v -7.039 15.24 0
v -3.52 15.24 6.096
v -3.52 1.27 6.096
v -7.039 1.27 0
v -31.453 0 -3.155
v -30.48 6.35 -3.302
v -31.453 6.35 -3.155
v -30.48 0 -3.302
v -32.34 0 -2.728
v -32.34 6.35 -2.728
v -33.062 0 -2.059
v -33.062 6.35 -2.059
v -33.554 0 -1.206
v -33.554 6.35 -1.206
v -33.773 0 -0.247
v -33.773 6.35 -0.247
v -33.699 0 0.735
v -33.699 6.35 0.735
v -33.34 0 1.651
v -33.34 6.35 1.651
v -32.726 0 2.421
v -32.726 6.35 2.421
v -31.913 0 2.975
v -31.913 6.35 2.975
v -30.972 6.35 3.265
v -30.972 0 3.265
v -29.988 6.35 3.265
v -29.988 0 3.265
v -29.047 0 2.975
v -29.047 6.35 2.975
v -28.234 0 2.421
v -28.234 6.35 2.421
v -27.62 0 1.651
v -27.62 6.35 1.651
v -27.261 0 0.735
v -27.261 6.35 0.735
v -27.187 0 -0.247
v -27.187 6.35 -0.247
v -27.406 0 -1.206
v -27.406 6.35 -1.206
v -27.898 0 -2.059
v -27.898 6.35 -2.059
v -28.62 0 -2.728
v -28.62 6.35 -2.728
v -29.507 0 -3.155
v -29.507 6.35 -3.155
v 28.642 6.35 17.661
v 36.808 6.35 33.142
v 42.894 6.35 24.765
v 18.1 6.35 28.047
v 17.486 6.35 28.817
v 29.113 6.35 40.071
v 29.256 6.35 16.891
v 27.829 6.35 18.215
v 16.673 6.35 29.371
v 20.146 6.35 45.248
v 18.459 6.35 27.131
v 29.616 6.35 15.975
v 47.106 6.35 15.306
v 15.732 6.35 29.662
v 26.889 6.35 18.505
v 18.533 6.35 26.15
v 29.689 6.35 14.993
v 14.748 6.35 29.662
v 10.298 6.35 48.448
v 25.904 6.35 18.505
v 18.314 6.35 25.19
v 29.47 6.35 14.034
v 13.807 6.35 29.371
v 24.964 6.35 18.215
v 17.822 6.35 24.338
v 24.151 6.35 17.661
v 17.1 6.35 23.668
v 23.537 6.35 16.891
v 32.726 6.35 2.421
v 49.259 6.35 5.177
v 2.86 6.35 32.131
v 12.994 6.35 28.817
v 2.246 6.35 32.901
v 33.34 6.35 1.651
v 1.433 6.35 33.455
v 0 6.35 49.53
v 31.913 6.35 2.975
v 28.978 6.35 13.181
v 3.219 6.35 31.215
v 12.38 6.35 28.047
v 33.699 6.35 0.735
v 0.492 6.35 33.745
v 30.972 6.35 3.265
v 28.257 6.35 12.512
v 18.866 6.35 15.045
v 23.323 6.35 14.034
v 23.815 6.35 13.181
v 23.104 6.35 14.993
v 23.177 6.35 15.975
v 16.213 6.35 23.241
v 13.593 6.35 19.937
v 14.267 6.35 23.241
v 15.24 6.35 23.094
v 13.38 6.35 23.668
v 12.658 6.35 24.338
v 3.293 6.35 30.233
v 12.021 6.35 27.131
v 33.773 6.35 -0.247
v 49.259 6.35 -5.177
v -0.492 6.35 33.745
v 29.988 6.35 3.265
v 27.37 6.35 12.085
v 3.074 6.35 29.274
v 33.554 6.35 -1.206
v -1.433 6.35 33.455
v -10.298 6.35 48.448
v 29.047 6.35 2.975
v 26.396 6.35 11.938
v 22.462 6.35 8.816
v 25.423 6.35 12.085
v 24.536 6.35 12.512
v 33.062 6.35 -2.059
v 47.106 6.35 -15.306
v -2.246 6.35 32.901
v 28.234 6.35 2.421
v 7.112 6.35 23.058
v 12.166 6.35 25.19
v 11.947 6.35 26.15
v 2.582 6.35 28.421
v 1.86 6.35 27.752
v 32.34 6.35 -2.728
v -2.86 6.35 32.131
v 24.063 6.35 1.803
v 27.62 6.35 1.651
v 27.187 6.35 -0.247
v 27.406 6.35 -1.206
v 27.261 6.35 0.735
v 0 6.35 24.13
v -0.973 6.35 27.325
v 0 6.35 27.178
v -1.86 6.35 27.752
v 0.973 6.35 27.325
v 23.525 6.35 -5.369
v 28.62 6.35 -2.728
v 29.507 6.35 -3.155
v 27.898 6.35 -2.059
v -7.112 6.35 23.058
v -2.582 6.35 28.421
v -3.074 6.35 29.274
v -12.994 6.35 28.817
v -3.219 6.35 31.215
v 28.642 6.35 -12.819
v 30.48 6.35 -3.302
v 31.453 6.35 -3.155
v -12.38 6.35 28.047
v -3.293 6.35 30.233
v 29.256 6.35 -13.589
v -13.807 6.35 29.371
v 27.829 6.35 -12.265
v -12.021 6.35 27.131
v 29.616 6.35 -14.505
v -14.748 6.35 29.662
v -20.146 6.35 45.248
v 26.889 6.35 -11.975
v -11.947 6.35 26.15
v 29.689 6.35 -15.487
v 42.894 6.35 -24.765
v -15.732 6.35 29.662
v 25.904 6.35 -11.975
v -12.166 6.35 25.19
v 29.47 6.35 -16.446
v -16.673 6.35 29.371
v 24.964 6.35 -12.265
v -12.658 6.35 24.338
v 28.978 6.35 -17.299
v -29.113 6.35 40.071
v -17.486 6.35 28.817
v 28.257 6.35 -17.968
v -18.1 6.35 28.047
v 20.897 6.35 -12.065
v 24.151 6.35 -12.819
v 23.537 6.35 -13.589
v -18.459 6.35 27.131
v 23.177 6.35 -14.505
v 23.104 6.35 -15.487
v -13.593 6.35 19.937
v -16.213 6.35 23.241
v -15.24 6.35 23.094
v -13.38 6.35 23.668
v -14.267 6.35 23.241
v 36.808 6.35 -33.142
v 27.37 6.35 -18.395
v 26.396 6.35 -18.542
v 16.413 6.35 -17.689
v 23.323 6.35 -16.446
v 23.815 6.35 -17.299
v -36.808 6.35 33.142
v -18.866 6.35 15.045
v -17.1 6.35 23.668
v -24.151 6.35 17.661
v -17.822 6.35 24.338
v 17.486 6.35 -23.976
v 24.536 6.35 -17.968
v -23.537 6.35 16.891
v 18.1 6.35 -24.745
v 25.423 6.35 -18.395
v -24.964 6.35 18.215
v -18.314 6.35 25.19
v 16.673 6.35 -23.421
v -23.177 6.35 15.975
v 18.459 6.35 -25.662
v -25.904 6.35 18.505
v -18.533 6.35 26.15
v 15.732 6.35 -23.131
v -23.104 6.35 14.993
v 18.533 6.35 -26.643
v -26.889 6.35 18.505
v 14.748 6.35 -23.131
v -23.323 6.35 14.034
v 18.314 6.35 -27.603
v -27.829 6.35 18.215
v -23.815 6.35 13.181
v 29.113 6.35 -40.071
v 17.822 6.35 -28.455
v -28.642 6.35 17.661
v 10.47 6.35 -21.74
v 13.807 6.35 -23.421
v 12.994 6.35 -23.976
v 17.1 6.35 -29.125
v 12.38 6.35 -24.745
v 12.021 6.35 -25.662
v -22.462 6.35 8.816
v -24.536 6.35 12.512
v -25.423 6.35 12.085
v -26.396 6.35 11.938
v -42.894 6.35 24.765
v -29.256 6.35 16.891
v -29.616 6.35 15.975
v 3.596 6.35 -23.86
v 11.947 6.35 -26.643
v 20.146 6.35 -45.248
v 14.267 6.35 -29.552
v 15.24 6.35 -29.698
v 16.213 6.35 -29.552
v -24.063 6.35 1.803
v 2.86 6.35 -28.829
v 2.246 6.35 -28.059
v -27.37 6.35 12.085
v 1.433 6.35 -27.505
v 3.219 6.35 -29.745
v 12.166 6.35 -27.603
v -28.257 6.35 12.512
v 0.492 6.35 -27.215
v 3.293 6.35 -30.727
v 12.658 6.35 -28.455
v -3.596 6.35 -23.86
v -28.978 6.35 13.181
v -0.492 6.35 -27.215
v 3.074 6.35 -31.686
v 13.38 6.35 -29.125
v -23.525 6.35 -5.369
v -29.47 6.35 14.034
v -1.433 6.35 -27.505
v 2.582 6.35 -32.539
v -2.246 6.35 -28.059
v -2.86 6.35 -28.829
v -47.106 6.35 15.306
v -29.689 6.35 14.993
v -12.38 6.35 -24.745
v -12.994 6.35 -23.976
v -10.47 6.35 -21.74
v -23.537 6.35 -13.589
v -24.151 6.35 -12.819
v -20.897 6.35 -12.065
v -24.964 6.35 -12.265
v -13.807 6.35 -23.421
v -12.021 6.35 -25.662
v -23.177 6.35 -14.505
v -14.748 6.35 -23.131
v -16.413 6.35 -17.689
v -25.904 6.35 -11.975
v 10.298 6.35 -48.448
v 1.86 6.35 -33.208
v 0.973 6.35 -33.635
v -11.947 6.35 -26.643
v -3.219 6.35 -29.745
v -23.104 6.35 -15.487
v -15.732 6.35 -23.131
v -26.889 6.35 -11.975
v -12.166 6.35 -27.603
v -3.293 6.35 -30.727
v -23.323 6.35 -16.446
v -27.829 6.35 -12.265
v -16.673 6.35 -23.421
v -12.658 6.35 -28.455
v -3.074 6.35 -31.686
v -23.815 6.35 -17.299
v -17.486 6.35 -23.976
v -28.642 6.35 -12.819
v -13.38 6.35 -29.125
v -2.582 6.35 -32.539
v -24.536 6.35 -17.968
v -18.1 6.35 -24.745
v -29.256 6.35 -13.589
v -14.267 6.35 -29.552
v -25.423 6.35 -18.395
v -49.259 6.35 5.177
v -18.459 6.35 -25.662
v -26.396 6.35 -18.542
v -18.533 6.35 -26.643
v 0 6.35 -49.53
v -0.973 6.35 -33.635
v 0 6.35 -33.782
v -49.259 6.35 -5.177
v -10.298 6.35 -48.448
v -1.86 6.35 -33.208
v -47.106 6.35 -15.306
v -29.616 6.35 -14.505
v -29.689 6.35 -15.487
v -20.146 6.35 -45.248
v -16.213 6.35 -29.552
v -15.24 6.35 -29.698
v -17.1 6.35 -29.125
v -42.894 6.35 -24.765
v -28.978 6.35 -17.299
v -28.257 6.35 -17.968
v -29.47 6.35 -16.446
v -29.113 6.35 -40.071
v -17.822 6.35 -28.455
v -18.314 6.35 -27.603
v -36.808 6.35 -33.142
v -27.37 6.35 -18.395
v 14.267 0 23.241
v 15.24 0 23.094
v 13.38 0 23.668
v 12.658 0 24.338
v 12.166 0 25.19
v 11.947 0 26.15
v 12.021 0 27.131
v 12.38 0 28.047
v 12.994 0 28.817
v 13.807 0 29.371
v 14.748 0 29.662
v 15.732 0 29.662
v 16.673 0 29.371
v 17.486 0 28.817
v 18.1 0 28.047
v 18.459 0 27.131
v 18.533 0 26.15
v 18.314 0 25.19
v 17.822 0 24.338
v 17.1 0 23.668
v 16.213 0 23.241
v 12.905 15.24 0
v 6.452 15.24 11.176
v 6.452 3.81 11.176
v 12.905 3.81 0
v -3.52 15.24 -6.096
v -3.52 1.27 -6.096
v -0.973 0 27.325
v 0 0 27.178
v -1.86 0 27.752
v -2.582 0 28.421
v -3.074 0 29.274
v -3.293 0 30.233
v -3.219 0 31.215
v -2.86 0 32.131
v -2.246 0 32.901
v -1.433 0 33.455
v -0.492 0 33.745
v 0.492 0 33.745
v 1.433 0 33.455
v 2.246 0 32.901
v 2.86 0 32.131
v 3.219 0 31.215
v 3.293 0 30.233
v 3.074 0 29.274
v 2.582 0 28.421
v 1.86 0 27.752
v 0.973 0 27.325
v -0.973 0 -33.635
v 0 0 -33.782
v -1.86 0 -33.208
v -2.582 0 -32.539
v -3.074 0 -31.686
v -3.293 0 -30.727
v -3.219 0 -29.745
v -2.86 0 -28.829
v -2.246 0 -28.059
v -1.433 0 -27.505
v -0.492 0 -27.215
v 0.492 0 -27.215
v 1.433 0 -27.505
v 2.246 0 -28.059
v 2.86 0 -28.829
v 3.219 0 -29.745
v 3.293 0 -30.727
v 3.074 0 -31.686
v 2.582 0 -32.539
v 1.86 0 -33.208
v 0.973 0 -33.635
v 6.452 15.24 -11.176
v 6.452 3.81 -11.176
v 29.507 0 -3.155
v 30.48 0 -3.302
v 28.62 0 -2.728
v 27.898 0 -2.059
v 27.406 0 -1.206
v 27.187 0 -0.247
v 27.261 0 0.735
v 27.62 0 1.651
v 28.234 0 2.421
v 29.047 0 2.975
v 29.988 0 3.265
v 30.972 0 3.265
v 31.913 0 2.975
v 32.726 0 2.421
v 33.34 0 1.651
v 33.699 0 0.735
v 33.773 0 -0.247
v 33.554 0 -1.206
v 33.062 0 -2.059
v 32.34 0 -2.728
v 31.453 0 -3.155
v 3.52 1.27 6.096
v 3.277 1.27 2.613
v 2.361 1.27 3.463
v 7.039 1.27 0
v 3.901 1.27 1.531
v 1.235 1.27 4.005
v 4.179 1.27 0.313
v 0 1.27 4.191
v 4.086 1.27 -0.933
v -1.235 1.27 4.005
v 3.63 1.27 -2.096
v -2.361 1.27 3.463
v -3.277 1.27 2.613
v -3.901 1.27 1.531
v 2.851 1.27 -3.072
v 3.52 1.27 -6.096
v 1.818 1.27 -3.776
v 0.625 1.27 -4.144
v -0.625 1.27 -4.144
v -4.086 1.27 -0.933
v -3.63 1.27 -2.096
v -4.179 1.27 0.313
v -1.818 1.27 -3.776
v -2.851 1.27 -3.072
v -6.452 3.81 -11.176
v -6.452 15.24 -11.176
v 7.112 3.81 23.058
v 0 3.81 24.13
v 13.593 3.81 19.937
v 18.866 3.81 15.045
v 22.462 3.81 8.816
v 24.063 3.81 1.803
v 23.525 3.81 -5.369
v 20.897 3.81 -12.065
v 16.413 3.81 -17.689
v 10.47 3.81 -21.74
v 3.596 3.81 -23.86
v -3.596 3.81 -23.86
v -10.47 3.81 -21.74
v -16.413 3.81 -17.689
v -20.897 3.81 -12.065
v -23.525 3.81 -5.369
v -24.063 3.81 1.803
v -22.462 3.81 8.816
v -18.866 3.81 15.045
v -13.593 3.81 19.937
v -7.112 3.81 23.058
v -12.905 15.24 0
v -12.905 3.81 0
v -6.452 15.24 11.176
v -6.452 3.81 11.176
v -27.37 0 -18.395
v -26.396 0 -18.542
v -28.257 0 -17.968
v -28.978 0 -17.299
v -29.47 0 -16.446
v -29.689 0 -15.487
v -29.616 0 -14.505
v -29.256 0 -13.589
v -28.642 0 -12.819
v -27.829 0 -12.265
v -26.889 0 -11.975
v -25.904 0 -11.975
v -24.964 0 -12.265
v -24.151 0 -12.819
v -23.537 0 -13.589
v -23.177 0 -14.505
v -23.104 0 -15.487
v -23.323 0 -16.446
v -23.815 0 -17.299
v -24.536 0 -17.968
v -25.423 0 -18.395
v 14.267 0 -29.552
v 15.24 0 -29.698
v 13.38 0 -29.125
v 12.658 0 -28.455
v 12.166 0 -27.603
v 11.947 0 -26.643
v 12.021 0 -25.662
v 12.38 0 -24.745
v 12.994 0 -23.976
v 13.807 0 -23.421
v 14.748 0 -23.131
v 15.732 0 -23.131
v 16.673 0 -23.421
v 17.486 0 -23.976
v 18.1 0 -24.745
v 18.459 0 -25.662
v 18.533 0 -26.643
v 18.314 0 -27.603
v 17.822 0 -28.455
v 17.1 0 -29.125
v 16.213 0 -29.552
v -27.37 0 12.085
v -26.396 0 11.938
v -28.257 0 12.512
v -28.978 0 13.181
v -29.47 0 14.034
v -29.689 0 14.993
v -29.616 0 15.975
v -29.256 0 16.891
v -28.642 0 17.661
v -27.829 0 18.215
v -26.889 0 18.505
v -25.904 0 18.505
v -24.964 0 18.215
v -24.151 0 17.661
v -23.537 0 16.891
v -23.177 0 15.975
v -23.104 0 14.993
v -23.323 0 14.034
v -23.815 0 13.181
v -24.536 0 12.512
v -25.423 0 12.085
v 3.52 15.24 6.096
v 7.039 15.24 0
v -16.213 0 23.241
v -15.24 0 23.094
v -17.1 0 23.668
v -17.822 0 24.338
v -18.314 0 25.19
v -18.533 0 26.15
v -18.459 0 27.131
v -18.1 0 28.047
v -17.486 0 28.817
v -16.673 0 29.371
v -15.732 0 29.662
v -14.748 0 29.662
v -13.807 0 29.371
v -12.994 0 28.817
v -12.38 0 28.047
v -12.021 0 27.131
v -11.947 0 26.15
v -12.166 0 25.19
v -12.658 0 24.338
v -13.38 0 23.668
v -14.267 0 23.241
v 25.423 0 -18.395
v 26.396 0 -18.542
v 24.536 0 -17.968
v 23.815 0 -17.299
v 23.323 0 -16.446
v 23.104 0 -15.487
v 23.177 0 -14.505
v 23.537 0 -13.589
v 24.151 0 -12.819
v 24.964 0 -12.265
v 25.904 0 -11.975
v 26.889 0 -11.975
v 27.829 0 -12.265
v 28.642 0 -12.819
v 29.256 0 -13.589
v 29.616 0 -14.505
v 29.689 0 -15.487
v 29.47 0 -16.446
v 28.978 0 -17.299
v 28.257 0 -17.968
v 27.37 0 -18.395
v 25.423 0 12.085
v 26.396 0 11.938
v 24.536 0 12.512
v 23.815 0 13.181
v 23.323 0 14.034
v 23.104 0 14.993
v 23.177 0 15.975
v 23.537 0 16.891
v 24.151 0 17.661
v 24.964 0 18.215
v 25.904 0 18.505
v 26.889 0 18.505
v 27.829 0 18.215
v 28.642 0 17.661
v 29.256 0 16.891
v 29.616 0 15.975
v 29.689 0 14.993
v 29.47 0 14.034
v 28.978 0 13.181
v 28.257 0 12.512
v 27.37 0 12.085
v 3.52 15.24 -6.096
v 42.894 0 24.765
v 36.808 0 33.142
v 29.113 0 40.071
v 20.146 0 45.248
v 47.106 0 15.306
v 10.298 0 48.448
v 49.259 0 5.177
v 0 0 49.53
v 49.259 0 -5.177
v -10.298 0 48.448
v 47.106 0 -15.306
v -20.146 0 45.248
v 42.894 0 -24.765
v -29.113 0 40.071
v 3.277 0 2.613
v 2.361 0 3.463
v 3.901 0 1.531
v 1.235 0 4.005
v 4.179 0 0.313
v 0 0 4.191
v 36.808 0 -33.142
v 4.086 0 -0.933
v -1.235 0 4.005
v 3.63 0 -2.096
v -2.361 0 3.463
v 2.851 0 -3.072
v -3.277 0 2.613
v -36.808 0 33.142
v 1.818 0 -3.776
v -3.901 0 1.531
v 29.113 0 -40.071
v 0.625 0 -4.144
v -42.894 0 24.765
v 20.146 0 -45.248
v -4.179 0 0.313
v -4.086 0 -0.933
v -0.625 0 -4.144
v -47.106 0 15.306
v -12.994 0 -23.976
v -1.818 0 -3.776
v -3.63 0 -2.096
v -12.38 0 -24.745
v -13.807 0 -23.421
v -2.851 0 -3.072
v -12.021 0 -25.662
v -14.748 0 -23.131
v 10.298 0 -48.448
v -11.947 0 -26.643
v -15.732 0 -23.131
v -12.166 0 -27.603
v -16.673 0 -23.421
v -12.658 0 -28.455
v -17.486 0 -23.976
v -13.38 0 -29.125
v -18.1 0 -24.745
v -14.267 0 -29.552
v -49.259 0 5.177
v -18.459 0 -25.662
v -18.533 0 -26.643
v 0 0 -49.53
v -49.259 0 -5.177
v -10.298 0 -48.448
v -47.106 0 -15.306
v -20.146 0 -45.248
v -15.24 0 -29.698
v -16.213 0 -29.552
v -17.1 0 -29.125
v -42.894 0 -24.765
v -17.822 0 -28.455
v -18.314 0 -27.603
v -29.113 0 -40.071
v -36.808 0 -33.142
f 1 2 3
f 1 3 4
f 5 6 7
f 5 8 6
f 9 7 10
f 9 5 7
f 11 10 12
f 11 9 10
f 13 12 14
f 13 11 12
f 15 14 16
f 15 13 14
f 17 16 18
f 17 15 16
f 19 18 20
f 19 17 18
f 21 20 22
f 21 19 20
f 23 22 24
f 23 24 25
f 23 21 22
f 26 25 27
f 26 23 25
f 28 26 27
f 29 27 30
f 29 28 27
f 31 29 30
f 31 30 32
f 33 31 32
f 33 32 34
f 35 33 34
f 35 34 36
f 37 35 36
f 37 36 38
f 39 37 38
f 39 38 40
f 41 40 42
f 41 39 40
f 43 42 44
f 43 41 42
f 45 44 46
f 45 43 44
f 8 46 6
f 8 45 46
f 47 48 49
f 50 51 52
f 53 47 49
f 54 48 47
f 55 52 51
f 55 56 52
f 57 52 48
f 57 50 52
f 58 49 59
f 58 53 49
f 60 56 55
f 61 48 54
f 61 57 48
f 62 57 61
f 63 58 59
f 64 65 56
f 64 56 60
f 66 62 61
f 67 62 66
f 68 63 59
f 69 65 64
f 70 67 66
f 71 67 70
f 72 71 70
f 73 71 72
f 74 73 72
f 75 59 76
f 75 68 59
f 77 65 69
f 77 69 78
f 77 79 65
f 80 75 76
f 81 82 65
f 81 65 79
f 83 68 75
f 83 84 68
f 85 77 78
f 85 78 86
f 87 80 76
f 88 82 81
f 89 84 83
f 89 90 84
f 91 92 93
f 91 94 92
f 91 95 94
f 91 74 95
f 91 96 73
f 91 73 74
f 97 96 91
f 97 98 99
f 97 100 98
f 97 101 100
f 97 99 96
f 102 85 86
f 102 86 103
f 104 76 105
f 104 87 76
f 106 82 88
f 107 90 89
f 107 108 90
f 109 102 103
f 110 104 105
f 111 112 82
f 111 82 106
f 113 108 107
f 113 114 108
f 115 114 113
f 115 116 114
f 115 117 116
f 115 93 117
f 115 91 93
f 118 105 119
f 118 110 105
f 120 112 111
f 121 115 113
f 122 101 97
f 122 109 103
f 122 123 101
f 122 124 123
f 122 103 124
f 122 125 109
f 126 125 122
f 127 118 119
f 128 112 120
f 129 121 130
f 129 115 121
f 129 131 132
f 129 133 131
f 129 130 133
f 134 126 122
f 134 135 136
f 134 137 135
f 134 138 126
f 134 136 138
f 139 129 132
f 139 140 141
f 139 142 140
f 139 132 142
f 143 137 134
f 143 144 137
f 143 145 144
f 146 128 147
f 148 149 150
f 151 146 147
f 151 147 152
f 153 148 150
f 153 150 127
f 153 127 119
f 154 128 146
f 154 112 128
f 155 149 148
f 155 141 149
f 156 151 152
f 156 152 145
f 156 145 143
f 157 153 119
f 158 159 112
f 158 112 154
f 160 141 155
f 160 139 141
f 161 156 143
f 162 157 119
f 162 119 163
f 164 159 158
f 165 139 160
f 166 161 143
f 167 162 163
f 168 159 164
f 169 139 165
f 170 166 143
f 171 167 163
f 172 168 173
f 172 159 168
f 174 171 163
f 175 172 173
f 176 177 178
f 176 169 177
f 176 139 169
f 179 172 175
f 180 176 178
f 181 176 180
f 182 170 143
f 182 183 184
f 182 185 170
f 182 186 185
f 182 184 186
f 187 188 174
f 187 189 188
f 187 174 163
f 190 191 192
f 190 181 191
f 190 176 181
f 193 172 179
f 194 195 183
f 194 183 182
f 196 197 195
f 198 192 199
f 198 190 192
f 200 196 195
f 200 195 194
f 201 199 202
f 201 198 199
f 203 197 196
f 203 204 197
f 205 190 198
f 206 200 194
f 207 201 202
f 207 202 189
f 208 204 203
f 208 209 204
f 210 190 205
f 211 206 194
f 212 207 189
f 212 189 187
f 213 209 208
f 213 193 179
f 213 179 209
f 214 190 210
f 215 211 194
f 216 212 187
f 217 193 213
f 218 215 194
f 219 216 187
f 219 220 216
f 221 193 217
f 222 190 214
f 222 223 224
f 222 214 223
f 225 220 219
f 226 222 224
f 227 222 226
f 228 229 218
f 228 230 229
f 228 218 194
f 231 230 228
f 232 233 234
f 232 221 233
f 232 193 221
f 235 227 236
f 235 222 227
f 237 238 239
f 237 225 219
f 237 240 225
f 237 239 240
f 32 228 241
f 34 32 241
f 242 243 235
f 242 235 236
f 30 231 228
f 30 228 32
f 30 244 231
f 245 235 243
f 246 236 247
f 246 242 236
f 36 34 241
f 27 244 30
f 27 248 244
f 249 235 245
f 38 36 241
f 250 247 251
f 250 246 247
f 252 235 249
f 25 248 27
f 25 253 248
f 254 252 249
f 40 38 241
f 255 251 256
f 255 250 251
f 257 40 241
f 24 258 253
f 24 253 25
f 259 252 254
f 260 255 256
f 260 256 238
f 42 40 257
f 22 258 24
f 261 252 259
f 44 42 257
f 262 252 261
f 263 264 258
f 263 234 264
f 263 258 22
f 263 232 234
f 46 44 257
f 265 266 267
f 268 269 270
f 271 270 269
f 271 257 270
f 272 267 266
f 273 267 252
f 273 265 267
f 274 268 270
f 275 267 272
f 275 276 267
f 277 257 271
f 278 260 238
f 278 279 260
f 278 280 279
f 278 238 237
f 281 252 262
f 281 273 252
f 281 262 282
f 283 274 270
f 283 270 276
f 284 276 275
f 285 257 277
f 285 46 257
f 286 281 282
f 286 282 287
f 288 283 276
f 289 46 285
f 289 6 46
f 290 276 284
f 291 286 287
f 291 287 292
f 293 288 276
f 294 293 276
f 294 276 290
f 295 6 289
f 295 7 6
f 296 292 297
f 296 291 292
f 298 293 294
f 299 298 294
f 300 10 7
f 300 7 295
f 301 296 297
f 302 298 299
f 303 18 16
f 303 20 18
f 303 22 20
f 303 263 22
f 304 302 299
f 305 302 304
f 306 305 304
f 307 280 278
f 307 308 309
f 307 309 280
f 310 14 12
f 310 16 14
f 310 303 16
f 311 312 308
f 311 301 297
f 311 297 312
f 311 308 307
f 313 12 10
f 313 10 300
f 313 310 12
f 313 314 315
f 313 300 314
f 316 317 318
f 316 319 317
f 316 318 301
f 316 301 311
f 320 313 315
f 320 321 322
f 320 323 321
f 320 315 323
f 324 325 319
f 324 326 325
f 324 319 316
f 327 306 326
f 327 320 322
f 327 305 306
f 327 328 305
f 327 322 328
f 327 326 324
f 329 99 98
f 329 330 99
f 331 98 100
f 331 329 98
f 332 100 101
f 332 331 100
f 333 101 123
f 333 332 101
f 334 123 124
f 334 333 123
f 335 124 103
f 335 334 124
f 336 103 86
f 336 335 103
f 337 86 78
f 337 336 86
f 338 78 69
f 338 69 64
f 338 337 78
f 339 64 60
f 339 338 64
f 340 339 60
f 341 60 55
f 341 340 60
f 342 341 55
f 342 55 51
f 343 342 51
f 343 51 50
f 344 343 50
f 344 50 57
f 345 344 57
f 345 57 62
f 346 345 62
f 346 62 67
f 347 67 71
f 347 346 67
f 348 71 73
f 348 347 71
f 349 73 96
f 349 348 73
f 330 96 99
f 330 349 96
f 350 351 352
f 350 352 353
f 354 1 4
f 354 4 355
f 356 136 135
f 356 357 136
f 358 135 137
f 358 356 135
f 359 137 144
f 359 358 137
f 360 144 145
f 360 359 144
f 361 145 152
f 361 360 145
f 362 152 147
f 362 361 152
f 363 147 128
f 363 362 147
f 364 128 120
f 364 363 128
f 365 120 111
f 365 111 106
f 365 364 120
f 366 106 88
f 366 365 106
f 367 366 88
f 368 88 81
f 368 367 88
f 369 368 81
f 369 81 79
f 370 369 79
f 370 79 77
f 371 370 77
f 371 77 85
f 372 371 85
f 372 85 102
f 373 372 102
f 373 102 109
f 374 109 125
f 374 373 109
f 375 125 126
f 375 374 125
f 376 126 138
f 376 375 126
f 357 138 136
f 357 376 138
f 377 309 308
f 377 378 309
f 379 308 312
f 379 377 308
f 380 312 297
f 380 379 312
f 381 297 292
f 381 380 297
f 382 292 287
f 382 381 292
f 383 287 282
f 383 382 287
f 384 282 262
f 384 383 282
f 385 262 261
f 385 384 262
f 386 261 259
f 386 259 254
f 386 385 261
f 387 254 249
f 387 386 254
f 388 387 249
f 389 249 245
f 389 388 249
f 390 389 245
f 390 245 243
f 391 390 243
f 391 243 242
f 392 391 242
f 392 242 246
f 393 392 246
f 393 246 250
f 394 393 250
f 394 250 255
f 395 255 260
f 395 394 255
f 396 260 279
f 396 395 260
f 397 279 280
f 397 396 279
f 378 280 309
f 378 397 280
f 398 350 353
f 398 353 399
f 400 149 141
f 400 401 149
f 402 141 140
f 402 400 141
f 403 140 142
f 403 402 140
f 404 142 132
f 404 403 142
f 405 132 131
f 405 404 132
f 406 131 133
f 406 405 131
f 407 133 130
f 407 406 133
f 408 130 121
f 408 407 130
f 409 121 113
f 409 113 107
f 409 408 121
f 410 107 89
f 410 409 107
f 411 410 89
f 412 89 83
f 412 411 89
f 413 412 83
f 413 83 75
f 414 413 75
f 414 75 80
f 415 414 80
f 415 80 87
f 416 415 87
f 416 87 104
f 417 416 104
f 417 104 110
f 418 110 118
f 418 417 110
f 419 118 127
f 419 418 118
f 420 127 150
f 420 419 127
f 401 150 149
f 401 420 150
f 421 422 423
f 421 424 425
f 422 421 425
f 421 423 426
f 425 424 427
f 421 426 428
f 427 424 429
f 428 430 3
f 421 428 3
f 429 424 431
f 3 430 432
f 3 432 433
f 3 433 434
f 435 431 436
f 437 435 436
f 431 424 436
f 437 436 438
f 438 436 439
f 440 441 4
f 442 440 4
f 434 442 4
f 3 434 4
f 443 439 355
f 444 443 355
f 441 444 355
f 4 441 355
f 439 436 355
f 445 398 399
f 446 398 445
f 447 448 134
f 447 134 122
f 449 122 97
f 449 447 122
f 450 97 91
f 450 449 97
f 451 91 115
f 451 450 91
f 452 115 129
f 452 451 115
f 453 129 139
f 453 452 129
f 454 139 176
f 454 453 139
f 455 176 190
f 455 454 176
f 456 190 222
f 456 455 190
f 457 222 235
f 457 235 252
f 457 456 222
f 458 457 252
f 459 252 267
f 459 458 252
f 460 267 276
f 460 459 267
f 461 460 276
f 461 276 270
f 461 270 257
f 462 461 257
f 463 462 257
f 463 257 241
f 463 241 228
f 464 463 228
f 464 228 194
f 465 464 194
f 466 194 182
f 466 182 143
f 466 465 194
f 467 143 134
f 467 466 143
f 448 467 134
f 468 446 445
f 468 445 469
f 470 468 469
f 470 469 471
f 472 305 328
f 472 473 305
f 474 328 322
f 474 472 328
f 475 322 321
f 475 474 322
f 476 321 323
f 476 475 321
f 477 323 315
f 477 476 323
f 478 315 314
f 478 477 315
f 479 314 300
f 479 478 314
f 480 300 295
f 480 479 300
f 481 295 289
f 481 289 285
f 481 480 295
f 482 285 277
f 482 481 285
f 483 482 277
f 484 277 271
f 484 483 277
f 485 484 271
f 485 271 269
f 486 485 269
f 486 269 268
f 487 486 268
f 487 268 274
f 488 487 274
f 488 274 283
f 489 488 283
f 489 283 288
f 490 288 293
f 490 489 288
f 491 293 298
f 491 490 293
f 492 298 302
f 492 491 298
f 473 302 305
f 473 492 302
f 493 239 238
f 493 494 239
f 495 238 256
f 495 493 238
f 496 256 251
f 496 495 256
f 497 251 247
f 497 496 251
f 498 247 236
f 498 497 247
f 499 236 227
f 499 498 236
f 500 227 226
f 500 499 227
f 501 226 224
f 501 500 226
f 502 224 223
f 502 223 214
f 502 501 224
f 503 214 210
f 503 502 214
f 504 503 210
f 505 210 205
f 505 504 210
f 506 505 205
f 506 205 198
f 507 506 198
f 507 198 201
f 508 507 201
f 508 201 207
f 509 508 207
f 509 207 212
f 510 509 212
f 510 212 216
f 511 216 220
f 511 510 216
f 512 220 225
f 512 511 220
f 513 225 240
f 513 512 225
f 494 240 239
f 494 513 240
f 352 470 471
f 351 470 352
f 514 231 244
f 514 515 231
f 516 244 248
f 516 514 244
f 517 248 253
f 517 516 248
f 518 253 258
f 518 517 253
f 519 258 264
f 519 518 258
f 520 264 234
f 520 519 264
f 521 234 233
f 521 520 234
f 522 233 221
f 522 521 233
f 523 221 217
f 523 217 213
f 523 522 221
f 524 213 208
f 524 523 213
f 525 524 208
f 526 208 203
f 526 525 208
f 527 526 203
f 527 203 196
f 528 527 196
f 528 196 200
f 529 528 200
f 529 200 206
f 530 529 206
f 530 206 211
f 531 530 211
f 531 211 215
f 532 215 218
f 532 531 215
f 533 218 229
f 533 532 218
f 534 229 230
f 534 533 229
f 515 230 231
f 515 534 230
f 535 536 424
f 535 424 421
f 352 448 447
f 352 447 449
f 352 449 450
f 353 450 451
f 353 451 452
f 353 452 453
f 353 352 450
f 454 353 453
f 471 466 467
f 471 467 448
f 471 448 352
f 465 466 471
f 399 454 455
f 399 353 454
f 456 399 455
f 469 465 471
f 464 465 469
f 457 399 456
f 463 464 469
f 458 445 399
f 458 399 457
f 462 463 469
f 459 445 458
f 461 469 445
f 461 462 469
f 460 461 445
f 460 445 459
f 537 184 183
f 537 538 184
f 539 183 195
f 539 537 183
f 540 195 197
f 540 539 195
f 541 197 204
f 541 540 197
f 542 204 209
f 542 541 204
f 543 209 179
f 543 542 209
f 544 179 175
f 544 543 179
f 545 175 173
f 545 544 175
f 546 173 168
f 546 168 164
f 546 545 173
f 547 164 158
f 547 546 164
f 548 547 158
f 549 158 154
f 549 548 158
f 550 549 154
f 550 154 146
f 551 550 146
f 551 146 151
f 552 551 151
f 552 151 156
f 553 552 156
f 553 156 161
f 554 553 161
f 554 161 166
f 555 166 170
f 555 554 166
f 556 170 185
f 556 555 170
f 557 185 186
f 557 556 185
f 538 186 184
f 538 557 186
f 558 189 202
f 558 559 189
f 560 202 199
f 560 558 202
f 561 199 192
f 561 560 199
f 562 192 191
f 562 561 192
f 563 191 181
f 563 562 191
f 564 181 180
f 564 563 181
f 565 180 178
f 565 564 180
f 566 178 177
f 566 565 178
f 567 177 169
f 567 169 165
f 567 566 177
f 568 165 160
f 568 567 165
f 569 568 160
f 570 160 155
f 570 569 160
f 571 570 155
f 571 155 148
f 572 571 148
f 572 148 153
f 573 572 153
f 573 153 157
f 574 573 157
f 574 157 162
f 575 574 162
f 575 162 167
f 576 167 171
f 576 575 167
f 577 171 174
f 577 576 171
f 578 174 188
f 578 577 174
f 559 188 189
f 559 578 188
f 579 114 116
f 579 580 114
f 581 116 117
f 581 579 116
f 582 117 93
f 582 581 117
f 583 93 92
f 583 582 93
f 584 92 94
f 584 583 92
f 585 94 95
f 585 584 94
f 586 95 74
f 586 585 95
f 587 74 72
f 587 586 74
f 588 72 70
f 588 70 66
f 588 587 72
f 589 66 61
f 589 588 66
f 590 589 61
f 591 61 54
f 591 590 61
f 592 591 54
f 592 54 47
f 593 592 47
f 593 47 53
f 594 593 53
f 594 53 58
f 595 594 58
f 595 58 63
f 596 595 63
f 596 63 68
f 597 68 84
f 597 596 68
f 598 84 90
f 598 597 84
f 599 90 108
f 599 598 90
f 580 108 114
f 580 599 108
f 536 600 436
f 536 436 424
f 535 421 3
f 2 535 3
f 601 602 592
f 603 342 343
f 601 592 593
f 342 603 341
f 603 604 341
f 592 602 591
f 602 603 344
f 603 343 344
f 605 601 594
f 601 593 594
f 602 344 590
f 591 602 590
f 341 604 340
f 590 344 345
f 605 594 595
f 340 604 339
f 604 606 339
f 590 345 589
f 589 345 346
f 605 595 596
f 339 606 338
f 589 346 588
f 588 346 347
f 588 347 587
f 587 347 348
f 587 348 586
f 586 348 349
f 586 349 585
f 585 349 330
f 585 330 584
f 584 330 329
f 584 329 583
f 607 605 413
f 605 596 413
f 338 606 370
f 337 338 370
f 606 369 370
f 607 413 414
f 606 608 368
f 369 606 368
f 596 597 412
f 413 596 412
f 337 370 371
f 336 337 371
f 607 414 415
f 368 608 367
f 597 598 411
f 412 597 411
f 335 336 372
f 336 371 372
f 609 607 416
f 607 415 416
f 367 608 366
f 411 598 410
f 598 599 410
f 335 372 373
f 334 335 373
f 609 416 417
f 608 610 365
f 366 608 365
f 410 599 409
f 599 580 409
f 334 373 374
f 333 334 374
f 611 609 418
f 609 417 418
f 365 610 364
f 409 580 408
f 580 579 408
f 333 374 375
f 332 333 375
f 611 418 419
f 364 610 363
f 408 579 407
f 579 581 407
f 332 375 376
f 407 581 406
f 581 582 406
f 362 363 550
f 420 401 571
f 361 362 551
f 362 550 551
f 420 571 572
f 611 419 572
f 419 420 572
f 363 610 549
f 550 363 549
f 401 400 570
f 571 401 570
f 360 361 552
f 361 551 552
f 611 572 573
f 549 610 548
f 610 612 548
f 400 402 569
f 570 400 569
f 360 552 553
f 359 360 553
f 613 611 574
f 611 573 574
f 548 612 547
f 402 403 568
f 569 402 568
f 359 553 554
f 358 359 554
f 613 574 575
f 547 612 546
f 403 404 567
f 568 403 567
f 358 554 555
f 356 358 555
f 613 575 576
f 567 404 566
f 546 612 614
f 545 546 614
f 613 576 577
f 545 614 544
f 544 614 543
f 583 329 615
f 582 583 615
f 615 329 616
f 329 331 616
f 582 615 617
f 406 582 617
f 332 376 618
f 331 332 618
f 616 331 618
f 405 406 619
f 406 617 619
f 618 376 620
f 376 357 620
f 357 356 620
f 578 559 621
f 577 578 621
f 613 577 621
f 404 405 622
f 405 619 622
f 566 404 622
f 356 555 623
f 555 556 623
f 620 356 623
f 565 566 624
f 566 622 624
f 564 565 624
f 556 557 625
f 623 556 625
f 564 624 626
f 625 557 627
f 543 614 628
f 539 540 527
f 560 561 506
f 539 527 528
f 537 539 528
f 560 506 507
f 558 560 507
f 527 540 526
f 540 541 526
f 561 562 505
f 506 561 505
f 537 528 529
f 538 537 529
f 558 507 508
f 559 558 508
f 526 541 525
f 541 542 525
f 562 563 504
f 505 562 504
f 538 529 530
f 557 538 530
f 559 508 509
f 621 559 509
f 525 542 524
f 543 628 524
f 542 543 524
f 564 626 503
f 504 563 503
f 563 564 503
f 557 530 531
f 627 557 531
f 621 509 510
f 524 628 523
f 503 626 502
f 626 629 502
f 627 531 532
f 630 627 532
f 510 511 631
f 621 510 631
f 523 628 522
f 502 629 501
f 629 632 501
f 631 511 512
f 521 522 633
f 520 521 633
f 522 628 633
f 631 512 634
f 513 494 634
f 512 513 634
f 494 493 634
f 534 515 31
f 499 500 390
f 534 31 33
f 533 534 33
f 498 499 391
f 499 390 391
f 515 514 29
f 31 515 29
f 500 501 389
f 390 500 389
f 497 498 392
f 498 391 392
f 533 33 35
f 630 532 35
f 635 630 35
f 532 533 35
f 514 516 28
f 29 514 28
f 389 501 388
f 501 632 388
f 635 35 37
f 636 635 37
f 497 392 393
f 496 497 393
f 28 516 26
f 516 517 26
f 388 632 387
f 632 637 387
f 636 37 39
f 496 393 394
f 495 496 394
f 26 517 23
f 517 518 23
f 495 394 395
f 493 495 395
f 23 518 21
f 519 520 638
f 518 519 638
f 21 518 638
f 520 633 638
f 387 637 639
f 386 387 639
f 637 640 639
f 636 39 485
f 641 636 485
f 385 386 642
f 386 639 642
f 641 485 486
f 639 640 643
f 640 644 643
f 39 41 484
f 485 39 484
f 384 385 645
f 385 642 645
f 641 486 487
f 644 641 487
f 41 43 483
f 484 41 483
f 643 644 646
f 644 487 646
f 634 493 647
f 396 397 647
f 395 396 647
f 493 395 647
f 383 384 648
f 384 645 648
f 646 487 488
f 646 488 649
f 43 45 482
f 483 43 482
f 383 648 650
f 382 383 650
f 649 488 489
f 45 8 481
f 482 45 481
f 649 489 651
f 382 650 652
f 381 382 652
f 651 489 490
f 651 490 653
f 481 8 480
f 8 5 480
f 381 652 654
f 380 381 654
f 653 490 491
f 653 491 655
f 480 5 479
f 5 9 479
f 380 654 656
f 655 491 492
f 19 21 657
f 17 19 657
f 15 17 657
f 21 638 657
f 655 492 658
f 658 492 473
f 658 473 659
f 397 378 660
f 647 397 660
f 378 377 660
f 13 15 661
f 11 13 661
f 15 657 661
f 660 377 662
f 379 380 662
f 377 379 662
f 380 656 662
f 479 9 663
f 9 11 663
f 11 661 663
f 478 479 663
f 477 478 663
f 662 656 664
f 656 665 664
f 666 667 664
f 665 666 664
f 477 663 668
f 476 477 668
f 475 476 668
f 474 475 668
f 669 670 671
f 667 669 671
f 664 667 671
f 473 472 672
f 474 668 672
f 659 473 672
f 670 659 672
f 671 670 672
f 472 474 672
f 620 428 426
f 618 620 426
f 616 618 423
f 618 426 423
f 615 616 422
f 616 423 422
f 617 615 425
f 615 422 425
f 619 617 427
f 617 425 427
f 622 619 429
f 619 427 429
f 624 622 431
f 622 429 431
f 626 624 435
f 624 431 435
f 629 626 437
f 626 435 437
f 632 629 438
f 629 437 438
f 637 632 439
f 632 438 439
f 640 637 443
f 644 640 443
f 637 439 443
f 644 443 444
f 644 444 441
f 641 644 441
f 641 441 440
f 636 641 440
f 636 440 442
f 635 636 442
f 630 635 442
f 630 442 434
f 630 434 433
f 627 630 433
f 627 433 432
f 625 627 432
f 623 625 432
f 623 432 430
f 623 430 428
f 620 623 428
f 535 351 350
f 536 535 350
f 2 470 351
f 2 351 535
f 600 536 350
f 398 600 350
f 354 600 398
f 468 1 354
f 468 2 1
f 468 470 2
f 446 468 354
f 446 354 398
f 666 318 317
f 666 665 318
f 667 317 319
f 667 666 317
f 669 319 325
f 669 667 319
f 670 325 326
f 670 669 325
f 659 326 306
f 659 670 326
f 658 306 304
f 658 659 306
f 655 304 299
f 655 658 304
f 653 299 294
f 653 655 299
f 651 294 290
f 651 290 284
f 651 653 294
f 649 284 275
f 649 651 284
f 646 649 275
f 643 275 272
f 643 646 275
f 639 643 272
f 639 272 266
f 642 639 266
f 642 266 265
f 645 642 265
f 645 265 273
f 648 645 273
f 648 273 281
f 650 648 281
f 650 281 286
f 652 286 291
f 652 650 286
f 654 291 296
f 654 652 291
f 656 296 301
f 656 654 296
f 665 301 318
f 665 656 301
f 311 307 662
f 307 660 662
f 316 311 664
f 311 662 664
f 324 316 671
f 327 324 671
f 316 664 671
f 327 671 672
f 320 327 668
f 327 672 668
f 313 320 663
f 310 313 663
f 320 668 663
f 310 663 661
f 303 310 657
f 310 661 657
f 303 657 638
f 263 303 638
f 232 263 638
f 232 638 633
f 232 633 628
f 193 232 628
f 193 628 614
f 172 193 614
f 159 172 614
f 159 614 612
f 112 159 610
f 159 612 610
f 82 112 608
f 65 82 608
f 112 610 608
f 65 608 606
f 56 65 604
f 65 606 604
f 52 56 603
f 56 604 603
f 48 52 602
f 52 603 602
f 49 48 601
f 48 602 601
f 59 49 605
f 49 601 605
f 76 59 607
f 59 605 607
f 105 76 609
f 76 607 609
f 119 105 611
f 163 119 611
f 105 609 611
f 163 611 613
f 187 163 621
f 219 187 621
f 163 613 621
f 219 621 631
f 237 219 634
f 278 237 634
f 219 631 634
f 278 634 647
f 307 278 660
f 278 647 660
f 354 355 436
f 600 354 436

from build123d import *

# Parameters (mm, degrees)
SKETCH1_R           = 49.53
BOSS_EXTRUDE1_DEPTH = 15.24
HEX_HOLE_DEPTH      = 13.97
SKETCH5_R           = 4.191
CENTERHOLE_DEPTH    = 72.425504548
SKETCH6_R           = 39.37
CUT_EXTRUDE1_DEPTH  = 11.43
SKETCH7_R           = 3.302
CUT_EXTRUDE2_DEPTH  = 72.684722222
SKETCH8_R           = 49.53
SKETCH8_R_2         = 39.37
CUT_EXTRUDE3_DEPTH  = 11.43
SKETCH9_R           = 49.53
SKETCH9_R_2         = 24.13
SKETCH9_R_3         = 3.302
BOSS_EXTRUDE2_DEPTH = 2.54


with BuildPart() as part:
    # Sketch1 → Boss-Extrude1 (new body)
    with BuildSketch(Plane(origin=(0, 0, 0), x_dir=(1, 0, 0), z_dir=(0, 1, 0))):
        with Locations(Location((0, 0, 0), (0, 0, 90))):
            Circle(SKETCH1_R)
    extrude(amount=BOSS_EXTRUDE1_DEPTH)

    # Sketch4 → Hex hole (cut)
    with BuildSketch(Plane(origin=(0, 15.24, 0), x_dir=(1, 0, 0), z_dir=(0, 1, 0))):
        Polygon((-3.519527241, 6.096), (3.519527241, 6.096), (7.039054482, 0), (3.519527241, -6.096), (-3.519527241, -6.096), (-7.039054482, 0), align=None)
    extrude(amount=-HEX_HOLE_DEPTH, mode=Mode.SUBTRACT)

    # Sketch5 → Centerhole (cut, through all)
    with BuildSketch(Plane(origin=(0, 1.27, 0), x_dir=(1, 0, 0), z_dir=(0, 1, 0))):
        with Locations(Location((0, 0, 0), (0, 0, 270))):
            Circle(SKETCH5_R)
    extrude(amount=-CENTERHOLE_DEPTH, mode=Mode.SUBTRACT)

    # Sketch6 → Cut-Extrude1 (cut)
    with BuildSketch(Plane(origin=(0, 15.24, 0), x_dir=(1, 0, 0), z_dir=(0, 1, 0))):
        with Locations(Location((0, 0, 0), (0, 0, 270))):
            Circle(SKETCH6_R)
        Polygon((12.904933217, 0), (6.452466608, 11.176), (-6.452466608, 11.176), (-12.904933217, 0), (-6.452466608, -11.176), (6.452466608, -11.176), align=None, mode=Mode.SUBTRACT)
    extrude(amount=-CUT_EXTRUDE1_DEPTH, mode=Mode.SUBTRACT)

    # Sketch7 → Cut-Extrude2 (cut, through all)
    with BuildSketch(Plane.XZ):
        with Locations(Location((0, 30.48, 0), (0, 0, 270))):
            Circle(SKETCH7_R)
        with Locations(Location((15.24, 26.396454307, 0), (0, 0, 270))):
            Circle(SKETCH7_R)
        with Locations(Location((26.396454307, 15.24, 0), (0, 0, 270))):
            Circle(SKETCH7_R)
        with Locations(Location((30.48, 0, 0), (0, 0, 270))):
            Circle(SKETCH7_R)
        with Locations(Location((26.396454307, -15.24, 0), (0, 0, 270))):
            Circle(SKETCH7_R)
        with Locations(Location((15.24, -26.396454307, 0), (0, 0, 270))):
            Circle(SKETCH7_R)
        with Locations(Location((0, -30.48, 0), (0, 0, 270))):
            Circle(SKETCH7_R)
        with Locations(Location((-15.24, -26.396454307, 0), (0, 0, 270))):
            Circle(SKETCH7_R)
        with Locations(Location((-26.396454307, -15.24, 0), (0, 0, 270))):
            Circle(SKETCH7_R)
        with Locations(Location((-30.48, 0, 0), (0, 0, 270))):
            Circle(SKETCH7_R)
        with Locations(Location((-26.396454307, 15.24, 0), (0, 0, 270))):
            Circle(SKETCH7_R)
        with Locations(Location((-15.24, 26.396454307, 0), (0, 0, 270))):
            Circle(SKETCH7_R)
    extrude(amount=-CUT_EXTRUDE2_DEPTH, mode=Mode.SUBTRACT)

    # Sketch8 → Cut-Extrude3 (cut)
    with BuildSketch(Plane(origin=(0, 15.24, 0), x_dir=(1, 0, 0), z_dir=(0, 1, 0))):
        with Locations(Location((0, 0, 0), (0, 0, 90))):
            Circle(SKETCH8_R)
        Circle(SKETCH8_R_2, mode=Mode.SUBTRACT)
    extrude(amount=-CUT_EXTRUDE3_DEPTH, mode=Mode.SUBTRACT)

    # Sketch9 → Boss-Extrude2 (add)
    with BuildSketch(Plane(origin=(0, 3.81, 0), x_dir=(1, 0, 0), z_dir=(0, 1, 0))):
        with Locations(Location((0, 0, 0), (0, 0, 90))):
            Circle(SKETCH9_R)
        with Locations(Location((0, 0, 0), (0, 0, 270))):
            Circle(SKETCH9_R_2, mode=Mode.SUBTRACT)
        with Locations(Location((0, 30.48, 0), (0, 0, 90))):
            Circle(SKETCH9_R_3, mode=Mode.SUBTRACT)
        with Locations(Location((15.24, 26.396454307, 0), (0, 0, 90))):
            Circle(SKETCH9_R_3, mode=Mode.SUBTRACT)
        with Locations(Location((26.396454307, 15.24, 0), (0, 0, 90))):
            Circle(SKETCH9_R_3, mode=Mode.SUBTRACT)
        with Locations(Location((30.48, 0, 0), (0, 0, 90))):
            Circle(SKETCH9_R_3, mode=Mode.SUBTRACT)
        with Locations(Location((26.396454307, -15.24, 0), (0, 0, 90))):
            Circle(SKETCH9_R_3, mode=Mode.SUBTRACT)
        with Locations(Location((15.24, -26.396454307, 0), (0, 0, 90))):
            Circle(SKETCH9_R_3, mode=Mode.SUBTRACT)
        with Locations(Location((0, -30.48, 0), (0, 0, 90))):
            Circle(SKETCH9_R_3, mode=Mode.SUBTRACT)
        with Locations(Location((-15.24, -26.396454307, 0), (0, 0, 90))):
            Circle(SKETCH9_R_3, mode=Mode.SUBTRACT)
        with Locations(Location((-26.396454307, -15.24, 0), (0, 0, 90))):
            Circle(SKETCH9_R_3, mode=Mode.SUBTRACT)
        with Locations(Location((-30.48, 0, 0), (0, 0, 90))):
            Circle(SKETCH9_R_3, mode=Mode.SUBTRACT)
        with Locations(Location((-26.396454307, 15.24, 0), (0, 0, 90))):
            Circle(SKETCH9_R_3, mode=Mode.SUBTRACT)
        with Locations(Location((-15.24, 26.396454307, 0), (0, 0, 90))):
            Circle(SKETCH9_R_3, mode=Mode.SUBTRACT)
    extrude(amount=BOSS_EXTRUDE2_DEPTH)


solid = part.part
